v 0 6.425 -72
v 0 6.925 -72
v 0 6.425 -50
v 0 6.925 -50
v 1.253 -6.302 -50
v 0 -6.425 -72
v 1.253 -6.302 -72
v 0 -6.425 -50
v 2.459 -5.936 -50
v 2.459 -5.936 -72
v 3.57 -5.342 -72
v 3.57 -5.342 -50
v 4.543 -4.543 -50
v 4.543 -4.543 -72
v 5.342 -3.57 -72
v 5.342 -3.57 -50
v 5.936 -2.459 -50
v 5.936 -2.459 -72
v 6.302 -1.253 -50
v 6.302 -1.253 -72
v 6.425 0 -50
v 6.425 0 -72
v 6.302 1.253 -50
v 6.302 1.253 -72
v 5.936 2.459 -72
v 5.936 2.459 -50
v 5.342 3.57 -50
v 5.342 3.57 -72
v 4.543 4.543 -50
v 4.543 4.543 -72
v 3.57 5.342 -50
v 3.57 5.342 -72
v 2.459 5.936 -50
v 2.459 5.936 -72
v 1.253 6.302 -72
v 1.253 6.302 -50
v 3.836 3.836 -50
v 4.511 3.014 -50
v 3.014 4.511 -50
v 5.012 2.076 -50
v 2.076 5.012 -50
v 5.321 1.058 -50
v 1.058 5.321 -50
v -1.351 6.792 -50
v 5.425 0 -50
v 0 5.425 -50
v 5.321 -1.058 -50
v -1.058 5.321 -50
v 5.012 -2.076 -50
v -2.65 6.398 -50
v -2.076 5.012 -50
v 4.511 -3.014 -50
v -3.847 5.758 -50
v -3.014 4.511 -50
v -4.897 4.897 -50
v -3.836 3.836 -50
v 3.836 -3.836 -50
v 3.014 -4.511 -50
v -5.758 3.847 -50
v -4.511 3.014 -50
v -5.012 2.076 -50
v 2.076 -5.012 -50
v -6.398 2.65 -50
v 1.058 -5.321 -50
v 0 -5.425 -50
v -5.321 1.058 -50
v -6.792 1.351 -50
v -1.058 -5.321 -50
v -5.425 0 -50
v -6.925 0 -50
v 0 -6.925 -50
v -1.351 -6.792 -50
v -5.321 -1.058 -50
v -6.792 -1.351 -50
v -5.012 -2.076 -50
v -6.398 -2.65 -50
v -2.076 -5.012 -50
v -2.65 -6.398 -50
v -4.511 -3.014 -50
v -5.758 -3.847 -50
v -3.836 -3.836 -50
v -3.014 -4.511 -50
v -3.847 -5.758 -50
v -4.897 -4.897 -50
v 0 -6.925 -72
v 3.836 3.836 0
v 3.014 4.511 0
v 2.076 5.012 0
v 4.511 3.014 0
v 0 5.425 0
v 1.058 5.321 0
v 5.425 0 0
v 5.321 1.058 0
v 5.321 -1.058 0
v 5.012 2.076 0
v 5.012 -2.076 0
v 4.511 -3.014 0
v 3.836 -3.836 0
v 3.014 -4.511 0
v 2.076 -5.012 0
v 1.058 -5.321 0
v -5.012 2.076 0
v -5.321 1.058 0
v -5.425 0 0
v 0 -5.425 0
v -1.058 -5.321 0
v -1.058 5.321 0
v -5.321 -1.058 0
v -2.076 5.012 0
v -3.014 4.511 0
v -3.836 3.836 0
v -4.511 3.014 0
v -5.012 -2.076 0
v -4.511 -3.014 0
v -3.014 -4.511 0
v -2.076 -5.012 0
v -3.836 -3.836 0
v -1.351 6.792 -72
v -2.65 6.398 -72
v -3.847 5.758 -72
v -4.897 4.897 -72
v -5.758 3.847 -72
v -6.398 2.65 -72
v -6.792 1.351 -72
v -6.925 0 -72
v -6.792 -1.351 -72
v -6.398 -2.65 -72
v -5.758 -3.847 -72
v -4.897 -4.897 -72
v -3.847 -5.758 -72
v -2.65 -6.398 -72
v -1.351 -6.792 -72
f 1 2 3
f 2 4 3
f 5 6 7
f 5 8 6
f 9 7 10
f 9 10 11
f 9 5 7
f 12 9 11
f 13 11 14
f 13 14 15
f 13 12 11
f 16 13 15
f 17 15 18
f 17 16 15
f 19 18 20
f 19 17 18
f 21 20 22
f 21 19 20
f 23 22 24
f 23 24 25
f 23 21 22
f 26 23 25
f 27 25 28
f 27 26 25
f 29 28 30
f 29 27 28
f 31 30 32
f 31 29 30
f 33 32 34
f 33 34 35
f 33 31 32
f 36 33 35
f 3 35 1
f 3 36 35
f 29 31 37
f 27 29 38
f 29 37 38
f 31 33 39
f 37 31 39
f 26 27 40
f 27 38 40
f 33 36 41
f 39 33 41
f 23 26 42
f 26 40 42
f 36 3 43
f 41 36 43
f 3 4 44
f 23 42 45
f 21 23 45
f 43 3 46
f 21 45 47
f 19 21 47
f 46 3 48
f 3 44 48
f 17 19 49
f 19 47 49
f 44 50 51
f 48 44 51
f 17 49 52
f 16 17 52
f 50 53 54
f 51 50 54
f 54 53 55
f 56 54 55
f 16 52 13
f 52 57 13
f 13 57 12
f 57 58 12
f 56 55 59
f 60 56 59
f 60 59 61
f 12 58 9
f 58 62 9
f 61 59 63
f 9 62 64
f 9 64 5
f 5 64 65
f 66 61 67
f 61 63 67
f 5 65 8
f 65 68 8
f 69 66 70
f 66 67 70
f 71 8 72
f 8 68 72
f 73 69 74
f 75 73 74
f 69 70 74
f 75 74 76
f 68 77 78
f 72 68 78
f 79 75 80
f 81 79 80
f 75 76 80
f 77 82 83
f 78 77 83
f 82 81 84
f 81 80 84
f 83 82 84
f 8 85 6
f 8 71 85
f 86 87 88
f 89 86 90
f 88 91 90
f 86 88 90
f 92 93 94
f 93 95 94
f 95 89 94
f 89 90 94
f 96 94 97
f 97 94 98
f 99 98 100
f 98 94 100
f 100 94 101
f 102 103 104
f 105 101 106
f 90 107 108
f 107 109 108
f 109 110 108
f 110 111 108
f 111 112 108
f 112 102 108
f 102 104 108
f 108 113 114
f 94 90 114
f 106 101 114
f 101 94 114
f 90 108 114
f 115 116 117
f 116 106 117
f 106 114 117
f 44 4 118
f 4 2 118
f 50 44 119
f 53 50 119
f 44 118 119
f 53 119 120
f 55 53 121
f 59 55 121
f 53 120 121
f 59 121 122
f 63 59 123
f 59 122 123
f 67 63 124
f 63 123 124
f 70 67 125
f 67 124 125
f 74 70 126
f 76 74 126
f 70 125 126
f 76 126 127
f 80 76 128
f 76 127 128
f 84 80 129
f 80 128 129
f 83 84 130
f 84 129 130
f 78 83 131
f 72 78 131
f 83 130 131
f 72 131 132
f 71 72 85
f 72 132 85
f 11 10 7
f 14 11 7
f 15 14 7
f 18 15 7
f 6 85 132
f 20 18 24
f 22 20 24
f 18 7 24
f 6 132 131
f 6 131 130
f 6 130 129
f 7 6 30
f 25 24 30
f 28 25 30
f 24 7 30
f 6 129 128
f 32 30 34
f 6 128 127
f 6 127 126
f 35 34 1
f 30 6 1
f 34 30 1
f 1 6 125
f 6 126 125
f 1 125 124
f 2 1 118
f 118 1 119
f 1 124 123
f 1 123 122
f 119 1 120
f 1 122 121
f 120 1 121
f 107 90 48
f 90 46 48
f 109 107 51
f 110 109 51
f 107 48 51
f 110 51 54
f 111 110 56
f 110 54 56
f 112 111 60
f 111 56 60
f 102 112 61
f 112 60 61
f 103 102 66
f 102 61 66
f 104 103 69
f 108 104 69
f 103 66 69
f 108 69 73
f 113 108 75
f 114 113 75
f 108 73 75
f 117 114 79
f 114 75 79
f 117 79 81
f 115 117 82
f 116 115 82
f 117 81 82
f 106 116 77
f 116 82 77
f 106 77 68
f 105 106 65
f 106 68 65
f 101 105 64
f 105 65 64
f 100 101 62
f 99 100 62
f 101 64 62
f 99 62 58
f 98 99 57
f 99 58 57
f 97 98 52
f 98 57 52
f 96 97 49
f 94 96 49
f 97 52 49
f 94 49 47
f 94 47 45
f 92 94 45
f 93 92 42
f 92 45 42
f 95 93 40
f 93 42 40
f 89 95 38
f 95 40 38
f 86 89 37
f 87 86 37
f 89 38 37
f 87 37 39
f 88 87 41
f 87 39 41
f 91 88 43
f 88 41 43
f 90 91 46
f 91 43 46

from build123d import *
from build123d import SkipClean  # not in build123d's __all__

# Parameters (mm, degrees)
F1_ANGLE_BACK = 90
F1_ANGLE      = 180
F3_ANGLE_BACK = 90
F3_ANGLE      = 180


with BuildPart() as f1:
    # F0 (on Front) → F1 (revolve)
    with BuildSketch(Plane.XZ, mode=Mode.PRIVATE) as f1_sk:
        Polygon((5.425, 0), (0, 0), (0, -72), (6.425, -72), (6.425, -50), (5.425, -50), align=None)
    revolve(f1_sk.sketch.rotate(Axis((0, 0, -36), (0, 0, 1)), -F1_ANGLE_BACK), axis=Axis((0, 0, -36), (0, 0, 1)), revolution_arc=F1_ANGLE)

    # F2 (on Front) → F3 (revolve)
    with BuildSketch(Plane.XZ, mode=Mode.PRIVATE) as f3_sk:
        Polygon((0, -72), (0, 0), (-5.425, 0), (-5.425, -50), (-6.925, -50), (-6.925, -72), align=None)
    revolve(f3_sk.sketch.rotate(Axis((0, 0, -36), (0, 0, 1)), -F3_ANGLE_BACK), axis=Axis((0, 0, -36), (0, 0, 1)), revolution_arc=F3_ANGLE)


solid = f1.part
